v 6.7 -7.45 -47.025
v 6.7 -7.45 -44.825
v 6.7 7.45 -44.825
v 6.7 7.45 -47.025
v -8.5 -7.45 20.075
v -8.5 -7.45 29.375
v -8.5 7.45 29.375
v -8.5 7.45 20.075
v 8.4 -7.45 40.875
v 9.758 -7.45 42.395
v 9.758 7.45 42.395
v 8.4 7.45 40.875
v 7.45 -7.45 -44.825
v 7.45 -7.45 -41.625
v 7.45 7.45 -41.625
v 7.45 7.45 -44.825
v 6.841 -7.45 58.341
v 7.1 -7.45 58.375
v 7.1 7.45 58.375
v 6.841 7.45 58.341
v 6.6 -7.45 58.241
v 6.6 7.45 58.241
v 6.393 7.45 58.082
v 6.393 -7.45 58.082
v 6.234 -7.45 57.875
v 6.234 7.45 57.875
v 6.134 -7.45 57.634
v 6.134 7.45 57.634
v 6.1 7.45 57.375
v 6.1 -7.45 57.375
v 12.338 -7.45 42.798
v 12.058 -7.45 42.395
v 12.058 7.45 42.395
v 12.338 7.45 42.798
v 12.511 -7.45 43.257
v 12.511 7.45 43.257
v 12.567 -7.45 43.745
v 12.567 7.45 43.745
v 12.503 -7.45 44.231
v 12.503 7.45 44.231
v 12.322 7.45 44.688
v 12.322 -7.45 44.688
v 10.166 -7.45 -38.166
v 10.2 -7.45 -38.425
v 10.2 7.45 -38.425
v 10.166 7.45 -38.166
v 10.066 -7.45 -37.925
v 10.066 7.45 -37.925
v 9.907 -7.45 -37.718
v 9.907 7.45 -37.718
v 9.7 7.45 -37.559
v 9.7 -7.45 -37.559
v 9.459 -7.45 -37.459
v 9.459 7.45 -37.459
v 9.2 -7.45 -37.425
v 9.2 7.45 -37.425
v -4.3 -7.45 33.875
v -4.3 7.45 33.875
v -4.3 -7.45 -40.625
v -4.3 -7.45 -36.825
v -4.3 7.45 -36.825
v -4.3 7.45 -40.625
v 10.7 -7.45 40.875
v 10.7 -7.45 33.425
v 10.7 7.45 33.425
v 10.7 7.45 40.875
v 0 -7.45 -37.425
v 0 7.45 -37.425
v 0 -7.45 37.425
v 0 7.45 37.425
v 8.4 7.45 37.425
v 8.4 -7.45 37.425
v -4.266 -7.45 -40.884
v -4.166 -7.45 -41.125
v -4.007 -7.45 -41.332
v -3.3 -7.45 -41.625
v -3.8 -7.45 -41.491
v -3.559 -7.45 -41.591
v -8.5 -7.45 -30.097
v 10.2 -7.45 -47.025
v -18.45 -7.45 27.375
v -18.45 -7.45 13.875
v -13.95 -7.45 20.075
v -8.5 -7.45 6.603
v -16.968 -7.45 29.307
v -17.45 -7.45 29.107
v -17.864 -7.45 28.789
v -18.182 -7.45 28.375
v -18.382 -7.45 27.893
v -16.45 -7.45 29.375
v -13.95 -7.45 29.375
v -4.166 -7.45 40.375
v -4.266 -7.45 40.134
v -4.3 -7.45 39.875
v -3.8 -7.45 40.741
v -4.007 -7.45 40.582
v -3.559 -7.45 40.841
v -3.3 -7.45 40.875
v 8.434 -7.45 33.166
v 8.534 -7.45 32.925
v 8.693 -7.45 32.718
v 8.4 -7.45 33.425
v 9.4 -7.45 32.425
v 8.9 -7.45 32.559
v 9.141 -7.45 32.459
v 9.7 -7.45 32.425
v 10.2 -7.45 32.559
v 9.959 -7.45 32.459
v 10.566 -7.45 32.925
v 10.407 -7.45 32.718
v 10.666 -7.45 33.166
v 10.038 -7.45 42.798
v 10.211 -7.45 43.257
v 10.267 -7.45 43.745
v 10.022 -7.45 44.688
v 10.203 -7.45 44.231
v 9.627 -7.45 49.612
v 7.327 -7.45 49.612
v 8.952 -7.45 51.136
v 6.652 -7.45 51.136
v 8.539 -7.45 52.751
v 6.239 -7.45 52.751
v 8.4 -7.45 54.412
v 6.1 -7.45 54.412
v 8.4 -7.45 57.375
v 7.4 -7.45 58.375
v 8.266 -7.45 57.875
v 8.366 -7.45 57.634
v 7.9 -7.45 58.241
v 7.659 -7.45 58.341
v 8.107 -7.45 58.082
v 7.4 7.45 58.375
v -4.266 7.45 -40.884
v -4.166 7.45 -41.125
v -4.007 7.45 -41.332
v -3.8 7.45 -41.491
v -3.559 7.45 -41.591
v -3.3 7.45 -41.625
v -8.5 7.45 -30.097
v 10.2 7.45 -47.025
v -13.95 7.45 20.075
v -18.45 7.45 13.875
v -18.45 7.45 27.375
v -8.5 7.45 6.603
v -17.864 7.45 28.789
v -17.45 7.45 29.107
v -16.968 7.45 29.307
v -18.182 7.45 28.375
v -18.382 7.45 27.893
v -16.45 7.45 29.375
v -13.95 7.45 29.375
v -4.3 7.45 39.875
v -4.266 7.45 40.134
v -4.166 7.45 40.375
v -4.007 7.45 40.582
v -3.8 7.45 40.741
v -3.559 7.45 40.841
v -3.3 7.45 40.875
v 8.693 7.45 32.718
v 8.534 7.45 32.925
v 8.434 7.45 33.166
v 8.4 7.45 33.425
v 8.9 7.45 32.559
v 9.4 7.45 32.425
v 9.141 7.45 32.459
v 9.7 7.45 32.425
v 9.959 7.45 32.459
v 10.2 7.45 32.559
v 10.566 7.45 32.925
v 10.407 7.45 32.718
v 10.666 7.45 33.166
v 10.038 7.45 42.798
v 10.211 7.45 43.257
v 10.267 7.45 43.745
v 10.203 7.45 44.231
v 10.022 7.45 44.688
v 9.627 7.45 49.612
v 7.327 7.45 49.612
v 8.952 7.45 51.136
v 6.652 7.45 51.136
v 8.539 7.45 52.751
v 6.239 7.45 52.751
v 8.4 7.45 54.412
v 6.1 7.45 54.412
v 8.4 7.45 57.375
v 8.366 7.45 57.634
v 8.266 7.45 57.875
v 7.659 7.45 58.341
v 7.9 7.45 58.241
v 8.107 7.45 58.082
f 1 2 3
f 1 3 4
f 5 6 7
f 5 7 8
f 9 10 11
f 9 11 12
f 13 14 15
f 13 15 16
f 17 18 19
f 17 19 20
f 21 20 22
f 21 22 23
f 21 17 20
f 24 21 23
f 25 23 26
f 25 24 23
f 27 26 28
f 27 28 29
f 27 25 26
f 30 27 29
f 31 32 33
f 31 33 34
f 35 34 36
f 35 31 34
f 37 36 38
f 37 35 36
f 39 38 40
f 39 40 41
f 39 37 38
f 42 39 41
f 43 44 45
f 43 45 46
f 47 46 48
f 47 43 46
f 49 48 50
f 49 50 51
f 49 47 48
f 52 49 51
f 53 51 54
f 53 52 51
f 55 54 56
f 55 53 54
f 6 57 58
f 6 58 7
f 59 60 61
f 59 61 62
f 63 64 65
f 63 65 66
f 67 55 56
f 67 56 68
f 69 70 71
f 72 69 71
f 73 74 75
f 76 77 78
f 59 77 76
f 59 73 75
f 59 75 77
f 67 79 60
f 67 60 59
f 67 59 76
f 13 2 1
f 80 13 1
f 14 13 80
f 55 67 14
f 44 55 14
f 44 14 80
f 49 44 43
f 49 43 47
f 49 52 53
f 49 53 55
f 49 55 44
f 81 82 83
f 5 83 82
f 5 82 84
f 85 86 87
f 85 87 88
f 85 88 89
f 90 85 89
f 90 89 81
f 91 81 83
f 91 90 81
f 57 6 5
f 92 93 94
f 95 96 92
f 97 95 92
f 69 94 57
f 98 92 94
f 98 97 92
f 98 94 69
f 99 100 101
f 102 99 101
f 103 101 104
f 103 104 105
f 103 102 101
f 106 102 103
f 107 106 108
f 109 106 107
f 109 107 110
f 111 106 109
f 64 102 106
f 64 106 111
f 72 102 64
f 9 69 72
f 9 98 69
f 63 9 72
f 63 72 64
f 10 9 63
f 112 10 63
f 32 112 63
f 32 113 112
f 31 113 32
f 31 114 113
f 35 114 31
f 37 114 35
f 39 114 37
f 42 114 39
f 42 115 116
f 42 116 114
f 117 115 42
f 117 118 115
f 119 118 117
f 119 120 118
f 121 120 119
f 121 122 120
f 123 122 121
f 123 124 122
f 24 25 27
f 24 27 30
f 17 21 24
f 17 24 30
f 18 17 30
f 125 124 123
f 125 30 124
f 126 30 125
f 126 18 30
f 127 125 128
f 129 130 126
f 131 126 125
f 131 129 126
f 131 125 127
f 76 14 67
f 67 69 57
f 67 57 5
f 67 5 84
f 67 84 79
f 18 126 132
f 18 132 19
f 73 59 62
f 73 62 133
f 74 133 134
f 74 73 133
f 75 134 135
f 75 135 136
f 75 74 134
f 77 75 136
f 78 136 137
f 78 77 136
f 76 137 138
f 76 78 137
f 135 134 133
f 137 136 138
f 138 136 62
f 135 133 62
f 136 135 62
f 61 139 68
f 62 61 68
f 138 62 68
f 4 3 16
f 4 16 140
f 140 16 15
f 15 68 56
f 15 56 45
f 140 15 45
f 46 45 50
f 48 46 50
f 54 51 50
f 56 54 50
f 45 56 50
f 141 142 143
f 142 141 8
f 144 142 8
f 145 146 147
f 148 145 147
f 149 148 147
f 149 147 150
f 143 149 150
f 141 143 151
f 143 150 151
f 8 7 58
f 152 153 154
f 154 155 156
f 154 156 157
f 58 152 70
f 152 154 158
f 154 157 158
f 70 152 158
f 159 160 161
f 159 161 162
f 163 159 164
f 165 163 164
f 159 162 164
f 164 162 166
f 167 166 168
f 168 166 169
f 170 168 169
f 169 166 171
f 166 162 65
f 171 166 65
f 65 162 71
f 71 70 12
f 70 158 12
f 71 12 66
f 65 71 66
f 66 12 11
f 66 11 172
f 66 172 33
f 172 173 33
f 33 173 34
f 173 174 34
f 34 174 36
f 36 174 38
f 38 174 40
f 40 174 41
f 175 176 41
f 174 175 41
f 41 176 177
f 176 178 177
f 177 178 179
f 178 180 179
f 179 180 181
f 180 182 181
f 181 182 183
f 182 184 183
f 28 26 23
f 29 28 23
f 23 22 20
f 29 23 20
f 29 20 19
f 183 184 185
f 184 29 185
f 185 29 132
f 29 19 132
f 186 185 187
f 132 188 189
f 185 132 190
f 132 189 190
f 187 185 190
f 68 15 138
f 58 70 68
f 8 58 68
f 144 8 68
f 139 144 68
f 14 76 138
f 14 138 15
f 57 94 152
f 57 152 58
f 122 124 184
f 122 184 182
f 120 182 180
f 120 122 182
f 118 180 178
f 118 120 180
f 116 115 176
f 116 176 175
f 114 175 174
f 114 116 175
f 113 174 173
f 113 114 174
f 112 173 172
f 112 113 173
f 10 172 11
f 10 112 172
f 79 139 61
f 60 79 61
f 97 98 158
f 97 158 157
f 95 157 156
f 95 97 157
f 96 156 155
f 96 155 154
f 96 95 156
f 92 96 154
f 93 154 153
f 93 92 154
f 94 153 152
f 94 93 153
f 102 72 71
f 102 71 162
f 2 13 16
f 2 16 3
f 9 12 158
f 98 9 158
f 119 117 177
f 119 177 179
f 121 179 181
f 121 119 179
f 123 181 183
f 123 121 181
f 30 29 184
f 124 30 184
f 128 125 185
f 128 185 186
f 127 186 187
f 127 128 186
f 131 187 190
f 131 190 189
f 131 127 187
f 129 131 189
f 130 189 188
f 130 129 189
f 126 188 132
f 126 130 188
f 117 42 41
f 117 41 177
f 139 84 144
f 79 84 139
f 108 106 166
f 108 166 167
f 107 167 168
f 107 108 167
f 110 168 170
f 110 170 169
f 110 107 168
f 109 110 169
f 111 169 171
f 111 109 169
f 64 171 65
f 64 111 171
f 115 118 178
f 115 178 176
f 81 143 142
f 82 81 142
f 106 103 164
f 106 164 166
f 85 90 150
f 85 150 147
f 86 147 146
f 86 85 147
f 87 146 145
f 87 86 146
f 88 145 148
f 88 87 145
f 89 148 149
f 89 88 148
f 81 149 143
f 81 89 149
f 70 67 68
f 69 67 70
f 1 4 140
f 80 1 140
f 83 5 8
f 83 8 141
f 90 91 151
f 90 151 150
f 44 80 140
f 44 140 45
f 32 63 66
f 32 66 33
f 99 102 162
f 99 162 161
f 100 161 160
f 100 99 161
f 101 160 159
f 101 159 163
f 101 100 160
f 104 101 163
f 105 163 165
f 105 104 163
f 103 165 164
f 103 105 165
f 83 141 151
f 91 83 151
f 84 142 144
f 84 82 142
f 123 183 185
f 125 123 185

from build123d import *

# Parameters (mm, degrees)
F1_DEPTH = 7.45


with BuildPart() as f1:
    # F0 (on Front) → F1 (new body, symmetric)
    with BuildSketch(Plane.XZ):
        with BuildLine():
            Line((-8.5, -30.0970471648), (-4.3, -36.825))
            Line((-4.3, -36.825), (-4.3, -40.625))
            ThreePointArc((-4.3, -40.625), (-4.0071067812, -41.3321067812), (-3.3, -41.625))
            Line((-3.3, -41.625), (7.45, -41.625))
            Line((7.45, -41.625), (7.45, -44.825))
            Line((7.45, -44.825), (6.7, -44.825))
            Line((6.7, -44.825), (6.7, -47.025))
            Line((6.7, -47.025), (10.2, -47.025))
            Line((10.2, -47.025), (10.2, -38.425))
            ThreePointArc((10.2, -38.425), (9.9071067812, -37.7178932188), (9.2, -37.425))
            Line((9.2, -37.425), (0, -37.425))
            Line((0, -37.425), (0, 37.425))
            Line((0, 37.425), (8.4, 37.425))
            Line((8.4, 37.425), (8.4, 33.425))
            ThreePointArc((8.4, 33.425), (8.6928932188, 32.7178932188), (9.4, 32.425))
            Line((9.4, 32.425), (9.7, 32.425))
            ThreePointArc((9.7, 32.425), (10.4071067812, 32.7178932188), (10.7, 33.425))
            Line((10.7, 33.425), (10.7, 40.875))
            Line((10.7, 40.875), (12.0584372697, 42.3947607825))
            ThreePointArc((12.0584372697, 42.3947607825), (12.5542284753, 43.4993517405), (12.3218441058, 44.6875973417))
            Line((12.3218441058, 44.6875973417), (9.6272657122, 49.6124442137))
            ThreePointArc((9.6272657122, 49.6124442137), (8.7116734449, 51.9351925206), (8.4, 54.4123539124))
            Line((8.4, 54.4123539124), (8.4, 57.375))
            ThreePointArc((8.4, 57.375), (8.1071067812, 58.0821067812), (7.4, 58.375))
            Line((7.4, 58.375), (7.1, 58.375))
            ThreePointArc((7.1, 58.375), (6.3928932188, 58.0821067812), (6.1, 57.375))
            Line((6.1, 57.375), (6.1, 54.4123539124))
            ThreePointArc((6.1, 54.4123539124), (6.4116734449, 51.9351925206), (7.3272657122, 49.6124442137))
            Line((7.3272657122, 49.6124442137), (10.0218441058, 44.6875973417))
            ThreePointArc((10.0218441058, 44.6875973417), (10.2542284753, 43.4993517405), (9.7584372697, 42.3947607825))
            Line((9.7584372697, 42.3947607825), (8.4, 40.875))
            Line((8.4, 40.875), (-3.3, 40.875))
            ThreePointArc((-3.3, 40.875), (-4.0071067812, 40.5821067812), (-4.3, 39.875))
            Line((-4.3, 39.875), (-4.3, 33.875))
            Line((-4.3, 33.875), (-8.5, 29.375))
            Line((-8.5, 29.375), (-8.5, 20.075))
            Line((-8.5, 20.075), (-13.95, 20.075))
            Line((-13.95, 20.075), (-13.95, 29.375))
            Line((-13.95, 29.375), (-16.45, 29.375))
            ThreePointArc((-16.45, 29.375), (-17.8642135624, 28.7892135624), (-18.45, 27.375))
            Line((-18.45, 27.375), (-18.45, 13.875))
            Line((-18.45, 13.875), (-8.5, 6.6029528352))
            Line((-8.5, 6.6029528352), (-8.5, -30.0970471648))
        make_face()
    extrude(amount=F1_DEPTH, both=True)


solid = f1.part
